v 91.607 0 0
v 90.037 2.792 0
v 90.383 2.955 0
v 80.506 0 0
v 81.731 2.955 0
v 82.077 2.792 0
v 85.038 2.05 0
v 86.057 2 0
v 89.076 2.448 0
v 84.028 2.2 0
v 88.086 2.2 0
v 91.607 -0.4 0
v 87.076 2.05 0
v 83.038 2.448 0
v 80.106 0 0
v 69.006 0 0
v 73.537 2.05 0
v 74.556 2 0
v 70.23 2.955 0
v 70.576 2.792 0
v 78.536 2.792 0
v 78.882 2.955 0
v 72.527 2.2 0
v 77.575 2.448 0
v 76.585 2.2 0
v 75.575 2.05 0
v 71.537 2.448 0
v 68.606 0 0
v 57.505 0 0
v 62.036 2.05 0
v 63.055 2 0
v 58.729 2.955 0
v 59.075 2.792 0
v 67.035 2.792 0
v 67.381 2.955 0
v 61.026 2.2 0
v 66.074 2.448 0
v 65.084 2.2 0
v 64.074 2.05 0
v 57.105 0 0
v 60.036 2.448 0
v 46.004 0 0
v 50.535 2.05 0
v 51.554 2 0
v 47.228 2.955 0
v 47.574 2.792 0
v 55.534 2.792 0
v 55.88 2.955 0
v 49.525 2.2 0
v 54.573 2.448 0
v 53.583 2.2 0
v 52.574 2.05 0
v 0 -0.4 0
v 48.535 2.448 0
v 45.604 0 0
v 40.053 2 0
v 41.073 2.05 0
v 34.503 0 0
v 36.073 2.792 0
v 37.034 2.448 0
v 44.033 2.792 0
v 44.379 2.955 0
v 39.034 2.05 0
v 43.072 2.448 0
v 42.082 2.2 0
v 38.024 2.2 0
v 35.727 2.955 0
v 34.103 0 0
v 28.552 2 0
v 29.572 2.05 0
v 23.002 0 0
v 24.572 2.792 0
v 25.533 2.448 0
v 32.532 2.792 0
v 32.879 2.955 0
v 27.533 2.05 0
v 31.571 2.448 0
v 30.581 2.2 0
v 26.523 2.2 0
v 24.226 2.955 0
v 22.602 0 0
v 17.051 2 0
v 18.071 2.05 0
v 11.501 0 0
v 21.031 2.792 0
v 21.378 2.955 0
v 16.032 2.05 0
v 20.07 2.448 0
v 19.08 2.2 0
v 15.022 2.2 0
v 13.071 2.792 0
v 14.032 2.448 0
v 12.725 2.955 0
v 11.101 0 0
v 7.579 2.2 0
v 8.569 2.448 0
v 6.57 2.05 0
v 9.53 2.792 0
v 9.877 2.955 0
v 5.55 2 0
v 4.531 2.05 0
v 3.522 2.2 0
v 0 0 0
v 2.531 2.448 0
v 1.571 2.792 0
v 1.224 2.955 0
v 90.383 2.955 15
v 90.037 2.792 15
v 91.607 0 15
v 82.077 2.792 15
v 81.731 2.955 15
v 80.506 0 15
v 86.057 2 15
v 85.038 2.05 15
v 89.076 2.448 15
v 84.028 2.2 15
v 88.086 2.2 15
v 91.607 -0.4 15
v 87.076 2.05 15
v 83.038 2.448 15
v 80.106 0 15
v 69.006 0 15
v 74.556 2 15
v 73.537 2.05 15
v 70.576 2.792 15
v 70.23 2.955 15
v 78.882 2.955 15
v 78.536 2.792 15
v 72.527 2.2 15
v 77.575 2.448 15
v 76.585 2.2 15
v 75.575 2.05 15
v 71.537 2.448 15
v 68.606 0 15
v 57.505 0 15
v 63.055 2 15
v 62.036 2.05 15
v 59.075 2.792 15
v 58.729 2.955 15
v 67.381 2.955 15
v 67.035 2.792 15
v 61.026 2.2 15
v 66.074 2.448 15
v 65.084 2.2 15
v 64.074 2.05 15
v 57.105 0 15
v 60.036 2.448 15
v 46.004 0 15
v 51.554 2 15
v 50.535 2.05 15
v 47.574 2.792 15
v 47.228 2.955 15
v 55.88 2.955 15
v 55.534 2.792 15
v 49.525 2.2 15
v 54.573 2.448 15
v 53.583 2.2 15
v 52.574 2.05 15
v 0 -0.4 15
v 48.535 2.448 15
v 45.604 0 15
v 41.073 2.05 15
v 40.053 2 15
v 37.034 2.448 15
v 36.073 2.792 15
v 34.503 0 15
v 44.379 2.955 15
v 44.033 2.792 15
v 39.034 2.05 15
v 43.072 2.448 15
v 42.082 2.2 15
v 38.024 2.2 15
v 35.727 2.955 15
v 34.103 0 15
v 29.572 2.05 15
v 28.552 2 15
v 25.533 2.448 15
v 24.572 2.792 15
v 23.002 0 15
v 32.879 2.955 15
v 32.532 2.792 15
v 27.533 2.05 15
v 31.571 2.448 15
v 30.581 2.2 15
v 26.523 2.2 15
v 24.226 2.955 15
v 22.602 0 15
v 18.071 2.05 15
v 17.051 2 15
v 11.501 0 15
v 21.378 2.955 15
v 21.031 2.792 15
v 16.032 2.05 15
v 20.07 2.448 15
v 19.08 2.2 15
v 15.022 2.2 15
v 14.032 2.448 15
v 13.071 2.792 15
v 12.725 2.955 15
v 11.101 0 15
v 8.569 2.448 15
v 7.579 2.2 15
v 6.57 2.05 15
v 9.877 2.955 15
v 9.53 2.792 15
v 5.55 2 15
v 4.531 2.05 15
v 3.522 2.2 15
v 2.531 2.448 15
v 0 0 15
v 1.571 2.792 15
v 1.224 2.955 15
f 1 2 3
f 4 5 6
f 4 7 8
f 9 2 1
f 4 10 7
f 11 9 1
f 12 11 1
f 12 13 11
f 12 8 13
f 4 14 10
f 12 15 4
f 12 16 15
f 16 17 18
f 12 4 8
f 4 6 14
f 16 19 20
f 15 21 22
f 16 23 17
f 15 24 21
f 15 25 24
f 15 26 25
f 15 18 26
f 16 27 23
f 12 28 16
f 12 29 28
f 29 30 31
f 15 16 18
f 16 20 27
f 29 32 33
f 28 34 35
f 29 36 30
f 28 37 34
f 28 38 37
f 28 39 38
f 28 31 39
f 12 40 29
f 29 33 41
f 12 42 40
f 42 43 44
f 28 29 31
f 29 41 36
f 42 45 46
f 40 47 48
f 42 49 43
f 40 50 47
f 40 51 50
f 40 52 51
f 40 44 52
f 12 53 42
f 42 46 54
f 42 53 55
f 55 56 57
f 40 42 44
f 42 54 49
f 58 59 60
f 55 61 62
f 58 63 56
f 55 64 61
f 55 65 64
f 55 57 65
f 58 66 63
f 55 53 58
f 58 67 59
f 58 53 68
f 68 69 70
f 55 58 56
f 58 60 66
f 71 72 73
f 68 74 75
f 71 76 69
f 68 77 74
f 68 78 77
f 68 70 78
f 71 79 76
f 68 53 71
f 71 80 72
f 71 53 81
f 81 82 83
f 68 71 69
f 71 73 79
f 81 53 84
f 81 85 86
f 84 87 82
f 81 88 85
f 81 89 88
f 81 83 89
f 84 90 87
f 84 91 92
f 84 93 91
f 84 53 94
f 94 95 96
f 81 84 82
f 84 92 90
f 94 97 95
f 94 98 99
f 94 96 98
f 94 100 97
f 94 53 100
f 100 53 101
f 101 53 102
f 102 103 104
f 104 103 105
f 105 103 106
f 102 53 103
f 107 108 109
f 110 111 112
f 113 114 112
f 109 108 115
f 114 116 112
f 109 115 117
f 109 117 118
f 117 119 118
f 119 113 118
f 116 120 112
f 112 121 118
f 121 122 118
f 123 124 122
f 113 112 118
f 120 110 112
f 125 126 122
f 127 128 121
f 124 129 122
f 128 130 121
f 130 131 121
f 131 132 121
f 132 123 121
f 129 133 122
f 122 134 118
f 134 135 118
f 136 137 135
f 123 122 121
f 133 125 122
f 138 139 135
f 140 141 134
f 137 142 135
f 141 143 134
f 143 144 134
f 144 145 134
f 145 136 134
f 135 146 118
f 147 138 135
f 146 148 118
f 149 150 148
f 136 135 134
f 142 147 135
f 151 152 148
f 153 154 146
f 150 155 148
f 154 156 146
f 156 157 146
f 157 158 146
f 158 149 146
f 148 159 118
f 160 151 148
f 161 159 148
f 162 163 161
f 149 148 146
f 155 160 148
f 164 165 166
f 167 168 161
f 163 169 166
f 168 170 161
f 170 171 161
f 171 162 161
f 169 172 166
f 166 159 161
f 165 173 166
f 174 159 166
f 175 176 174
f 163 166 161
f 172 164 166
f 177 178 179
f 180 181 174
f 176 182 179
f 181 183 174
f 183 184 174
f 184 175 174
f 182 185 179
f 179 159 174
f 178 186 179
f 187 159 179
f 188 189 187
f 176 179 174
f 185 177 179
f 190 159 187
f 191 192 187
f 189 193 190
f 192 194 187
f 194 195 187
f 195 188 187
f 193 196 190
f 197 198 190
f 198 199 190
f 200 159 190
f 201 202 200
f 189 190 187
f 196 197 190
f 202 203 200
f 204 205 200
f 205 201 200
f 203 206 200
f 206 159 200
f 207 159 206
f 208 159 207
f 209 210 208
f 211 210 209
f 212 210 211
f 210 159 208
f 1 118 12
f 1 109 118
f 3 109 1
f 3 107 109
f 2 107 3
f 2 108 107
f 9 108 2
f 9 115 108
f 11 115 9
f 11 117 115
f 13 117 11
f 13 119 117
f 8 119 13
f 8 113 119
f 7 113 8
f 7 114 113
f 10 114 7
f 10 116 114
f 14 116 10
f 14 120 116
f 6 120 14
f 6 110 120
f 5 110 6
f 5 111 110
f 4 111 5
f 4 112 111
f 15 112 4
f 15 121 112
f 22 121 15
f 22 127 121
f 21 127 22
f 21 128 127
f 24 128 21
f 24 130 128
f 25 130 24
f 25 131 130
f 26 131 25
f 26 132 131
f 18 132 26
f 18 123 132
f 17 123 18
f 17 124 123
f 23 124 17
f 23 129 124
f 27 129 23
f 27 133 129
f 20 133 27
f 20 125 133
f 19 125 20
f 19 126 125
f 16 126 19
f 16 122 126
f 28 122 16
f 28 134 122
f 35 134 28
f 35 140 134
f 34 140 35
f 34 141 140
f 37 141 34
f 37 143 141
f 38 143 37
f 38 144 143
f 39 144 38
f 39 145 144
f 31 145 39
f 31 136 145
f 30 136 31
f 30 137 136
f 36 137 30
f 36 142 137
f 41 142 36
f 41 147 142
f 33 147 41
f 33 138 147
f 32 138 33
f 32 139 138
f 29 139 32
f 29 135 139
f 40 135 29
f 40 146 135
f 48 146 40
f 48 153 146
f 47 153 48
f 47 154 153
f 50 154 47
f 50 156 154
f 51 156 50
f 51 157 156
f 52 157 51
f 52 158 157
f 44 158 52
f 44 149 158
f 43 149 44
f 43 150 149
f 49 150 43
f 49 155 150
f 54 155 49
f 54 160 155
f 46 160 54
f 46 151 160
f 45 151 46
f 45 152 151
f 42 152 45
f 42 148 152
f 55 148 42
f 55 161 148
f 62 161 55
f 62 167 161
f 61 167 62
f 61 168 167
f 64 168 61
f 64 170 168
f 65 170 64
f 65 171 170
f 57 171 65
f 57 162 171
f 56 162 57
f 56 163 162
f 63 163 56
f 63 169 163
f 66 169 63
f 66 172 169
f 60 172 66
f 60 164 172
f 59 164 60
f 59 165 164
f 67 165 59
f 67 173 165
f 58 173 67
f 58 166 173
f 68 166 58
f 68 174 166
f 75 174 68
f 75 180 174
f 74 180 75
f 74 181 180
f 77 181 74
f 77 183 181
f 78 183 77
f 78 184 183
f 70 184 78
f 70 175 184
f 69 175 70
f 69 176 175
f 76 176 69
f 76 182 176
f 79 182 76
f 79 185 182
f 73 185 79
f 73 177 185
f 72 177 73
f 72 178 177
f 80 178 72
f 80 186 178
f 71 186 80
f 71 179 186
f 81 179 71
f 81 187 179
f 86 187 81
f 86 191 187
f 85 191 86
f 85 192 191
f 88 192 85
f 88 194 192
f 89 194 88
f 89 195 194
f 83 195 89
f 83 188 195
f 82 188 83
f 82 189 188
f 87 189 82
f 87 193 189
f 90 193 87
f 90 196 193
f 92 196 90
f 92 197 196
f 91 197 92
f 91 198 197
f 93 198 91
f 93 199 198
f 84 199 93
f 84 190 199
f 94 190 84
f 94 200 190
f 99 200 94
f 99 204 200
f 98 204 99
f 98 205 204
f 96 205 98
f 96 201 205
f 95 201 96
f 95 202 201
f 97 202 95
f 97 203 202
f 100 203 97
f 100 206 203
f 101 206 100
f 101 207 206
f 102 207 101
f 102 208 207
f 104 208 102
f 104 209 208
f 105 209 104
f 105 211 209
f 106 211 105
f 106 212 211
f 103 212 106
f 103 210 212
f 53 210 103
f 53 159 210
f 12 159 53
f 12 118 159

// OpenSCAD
thickness = 3;
theta = 360/8;
c = 2 * 3.414 * 20.8;
d = 20.8 * tan(theta / 2);

linear_extrude(15) {
  for (i = [theta : theta : 360]) {
      translate([-(d + thickness * tan(theta / 2) * 2) - 0.4 + i / theta * (d + thickness * tan(theta / 2) * 2 + 0.4), 0, 0])
    difference() {
        polygon([
          [0, 0],
          [thickness * tan(theta / 2), thickness],
          [d + thickness * tan(theta / 2), thickness],
          [d + thickness * tan(theta / 2) * 2, 0]
        ]);
      
          translate([
        (d + thickness * tan(theta/2)*2) /2,
        12.4
      ]) circle(d=20.8, $fn = 64);
    }
  }

  translate([0, -0.4]) square([(d + thickness * tan(theta / 2) * 2) * 8 + (0.4 * 7), 0.4]);
}
